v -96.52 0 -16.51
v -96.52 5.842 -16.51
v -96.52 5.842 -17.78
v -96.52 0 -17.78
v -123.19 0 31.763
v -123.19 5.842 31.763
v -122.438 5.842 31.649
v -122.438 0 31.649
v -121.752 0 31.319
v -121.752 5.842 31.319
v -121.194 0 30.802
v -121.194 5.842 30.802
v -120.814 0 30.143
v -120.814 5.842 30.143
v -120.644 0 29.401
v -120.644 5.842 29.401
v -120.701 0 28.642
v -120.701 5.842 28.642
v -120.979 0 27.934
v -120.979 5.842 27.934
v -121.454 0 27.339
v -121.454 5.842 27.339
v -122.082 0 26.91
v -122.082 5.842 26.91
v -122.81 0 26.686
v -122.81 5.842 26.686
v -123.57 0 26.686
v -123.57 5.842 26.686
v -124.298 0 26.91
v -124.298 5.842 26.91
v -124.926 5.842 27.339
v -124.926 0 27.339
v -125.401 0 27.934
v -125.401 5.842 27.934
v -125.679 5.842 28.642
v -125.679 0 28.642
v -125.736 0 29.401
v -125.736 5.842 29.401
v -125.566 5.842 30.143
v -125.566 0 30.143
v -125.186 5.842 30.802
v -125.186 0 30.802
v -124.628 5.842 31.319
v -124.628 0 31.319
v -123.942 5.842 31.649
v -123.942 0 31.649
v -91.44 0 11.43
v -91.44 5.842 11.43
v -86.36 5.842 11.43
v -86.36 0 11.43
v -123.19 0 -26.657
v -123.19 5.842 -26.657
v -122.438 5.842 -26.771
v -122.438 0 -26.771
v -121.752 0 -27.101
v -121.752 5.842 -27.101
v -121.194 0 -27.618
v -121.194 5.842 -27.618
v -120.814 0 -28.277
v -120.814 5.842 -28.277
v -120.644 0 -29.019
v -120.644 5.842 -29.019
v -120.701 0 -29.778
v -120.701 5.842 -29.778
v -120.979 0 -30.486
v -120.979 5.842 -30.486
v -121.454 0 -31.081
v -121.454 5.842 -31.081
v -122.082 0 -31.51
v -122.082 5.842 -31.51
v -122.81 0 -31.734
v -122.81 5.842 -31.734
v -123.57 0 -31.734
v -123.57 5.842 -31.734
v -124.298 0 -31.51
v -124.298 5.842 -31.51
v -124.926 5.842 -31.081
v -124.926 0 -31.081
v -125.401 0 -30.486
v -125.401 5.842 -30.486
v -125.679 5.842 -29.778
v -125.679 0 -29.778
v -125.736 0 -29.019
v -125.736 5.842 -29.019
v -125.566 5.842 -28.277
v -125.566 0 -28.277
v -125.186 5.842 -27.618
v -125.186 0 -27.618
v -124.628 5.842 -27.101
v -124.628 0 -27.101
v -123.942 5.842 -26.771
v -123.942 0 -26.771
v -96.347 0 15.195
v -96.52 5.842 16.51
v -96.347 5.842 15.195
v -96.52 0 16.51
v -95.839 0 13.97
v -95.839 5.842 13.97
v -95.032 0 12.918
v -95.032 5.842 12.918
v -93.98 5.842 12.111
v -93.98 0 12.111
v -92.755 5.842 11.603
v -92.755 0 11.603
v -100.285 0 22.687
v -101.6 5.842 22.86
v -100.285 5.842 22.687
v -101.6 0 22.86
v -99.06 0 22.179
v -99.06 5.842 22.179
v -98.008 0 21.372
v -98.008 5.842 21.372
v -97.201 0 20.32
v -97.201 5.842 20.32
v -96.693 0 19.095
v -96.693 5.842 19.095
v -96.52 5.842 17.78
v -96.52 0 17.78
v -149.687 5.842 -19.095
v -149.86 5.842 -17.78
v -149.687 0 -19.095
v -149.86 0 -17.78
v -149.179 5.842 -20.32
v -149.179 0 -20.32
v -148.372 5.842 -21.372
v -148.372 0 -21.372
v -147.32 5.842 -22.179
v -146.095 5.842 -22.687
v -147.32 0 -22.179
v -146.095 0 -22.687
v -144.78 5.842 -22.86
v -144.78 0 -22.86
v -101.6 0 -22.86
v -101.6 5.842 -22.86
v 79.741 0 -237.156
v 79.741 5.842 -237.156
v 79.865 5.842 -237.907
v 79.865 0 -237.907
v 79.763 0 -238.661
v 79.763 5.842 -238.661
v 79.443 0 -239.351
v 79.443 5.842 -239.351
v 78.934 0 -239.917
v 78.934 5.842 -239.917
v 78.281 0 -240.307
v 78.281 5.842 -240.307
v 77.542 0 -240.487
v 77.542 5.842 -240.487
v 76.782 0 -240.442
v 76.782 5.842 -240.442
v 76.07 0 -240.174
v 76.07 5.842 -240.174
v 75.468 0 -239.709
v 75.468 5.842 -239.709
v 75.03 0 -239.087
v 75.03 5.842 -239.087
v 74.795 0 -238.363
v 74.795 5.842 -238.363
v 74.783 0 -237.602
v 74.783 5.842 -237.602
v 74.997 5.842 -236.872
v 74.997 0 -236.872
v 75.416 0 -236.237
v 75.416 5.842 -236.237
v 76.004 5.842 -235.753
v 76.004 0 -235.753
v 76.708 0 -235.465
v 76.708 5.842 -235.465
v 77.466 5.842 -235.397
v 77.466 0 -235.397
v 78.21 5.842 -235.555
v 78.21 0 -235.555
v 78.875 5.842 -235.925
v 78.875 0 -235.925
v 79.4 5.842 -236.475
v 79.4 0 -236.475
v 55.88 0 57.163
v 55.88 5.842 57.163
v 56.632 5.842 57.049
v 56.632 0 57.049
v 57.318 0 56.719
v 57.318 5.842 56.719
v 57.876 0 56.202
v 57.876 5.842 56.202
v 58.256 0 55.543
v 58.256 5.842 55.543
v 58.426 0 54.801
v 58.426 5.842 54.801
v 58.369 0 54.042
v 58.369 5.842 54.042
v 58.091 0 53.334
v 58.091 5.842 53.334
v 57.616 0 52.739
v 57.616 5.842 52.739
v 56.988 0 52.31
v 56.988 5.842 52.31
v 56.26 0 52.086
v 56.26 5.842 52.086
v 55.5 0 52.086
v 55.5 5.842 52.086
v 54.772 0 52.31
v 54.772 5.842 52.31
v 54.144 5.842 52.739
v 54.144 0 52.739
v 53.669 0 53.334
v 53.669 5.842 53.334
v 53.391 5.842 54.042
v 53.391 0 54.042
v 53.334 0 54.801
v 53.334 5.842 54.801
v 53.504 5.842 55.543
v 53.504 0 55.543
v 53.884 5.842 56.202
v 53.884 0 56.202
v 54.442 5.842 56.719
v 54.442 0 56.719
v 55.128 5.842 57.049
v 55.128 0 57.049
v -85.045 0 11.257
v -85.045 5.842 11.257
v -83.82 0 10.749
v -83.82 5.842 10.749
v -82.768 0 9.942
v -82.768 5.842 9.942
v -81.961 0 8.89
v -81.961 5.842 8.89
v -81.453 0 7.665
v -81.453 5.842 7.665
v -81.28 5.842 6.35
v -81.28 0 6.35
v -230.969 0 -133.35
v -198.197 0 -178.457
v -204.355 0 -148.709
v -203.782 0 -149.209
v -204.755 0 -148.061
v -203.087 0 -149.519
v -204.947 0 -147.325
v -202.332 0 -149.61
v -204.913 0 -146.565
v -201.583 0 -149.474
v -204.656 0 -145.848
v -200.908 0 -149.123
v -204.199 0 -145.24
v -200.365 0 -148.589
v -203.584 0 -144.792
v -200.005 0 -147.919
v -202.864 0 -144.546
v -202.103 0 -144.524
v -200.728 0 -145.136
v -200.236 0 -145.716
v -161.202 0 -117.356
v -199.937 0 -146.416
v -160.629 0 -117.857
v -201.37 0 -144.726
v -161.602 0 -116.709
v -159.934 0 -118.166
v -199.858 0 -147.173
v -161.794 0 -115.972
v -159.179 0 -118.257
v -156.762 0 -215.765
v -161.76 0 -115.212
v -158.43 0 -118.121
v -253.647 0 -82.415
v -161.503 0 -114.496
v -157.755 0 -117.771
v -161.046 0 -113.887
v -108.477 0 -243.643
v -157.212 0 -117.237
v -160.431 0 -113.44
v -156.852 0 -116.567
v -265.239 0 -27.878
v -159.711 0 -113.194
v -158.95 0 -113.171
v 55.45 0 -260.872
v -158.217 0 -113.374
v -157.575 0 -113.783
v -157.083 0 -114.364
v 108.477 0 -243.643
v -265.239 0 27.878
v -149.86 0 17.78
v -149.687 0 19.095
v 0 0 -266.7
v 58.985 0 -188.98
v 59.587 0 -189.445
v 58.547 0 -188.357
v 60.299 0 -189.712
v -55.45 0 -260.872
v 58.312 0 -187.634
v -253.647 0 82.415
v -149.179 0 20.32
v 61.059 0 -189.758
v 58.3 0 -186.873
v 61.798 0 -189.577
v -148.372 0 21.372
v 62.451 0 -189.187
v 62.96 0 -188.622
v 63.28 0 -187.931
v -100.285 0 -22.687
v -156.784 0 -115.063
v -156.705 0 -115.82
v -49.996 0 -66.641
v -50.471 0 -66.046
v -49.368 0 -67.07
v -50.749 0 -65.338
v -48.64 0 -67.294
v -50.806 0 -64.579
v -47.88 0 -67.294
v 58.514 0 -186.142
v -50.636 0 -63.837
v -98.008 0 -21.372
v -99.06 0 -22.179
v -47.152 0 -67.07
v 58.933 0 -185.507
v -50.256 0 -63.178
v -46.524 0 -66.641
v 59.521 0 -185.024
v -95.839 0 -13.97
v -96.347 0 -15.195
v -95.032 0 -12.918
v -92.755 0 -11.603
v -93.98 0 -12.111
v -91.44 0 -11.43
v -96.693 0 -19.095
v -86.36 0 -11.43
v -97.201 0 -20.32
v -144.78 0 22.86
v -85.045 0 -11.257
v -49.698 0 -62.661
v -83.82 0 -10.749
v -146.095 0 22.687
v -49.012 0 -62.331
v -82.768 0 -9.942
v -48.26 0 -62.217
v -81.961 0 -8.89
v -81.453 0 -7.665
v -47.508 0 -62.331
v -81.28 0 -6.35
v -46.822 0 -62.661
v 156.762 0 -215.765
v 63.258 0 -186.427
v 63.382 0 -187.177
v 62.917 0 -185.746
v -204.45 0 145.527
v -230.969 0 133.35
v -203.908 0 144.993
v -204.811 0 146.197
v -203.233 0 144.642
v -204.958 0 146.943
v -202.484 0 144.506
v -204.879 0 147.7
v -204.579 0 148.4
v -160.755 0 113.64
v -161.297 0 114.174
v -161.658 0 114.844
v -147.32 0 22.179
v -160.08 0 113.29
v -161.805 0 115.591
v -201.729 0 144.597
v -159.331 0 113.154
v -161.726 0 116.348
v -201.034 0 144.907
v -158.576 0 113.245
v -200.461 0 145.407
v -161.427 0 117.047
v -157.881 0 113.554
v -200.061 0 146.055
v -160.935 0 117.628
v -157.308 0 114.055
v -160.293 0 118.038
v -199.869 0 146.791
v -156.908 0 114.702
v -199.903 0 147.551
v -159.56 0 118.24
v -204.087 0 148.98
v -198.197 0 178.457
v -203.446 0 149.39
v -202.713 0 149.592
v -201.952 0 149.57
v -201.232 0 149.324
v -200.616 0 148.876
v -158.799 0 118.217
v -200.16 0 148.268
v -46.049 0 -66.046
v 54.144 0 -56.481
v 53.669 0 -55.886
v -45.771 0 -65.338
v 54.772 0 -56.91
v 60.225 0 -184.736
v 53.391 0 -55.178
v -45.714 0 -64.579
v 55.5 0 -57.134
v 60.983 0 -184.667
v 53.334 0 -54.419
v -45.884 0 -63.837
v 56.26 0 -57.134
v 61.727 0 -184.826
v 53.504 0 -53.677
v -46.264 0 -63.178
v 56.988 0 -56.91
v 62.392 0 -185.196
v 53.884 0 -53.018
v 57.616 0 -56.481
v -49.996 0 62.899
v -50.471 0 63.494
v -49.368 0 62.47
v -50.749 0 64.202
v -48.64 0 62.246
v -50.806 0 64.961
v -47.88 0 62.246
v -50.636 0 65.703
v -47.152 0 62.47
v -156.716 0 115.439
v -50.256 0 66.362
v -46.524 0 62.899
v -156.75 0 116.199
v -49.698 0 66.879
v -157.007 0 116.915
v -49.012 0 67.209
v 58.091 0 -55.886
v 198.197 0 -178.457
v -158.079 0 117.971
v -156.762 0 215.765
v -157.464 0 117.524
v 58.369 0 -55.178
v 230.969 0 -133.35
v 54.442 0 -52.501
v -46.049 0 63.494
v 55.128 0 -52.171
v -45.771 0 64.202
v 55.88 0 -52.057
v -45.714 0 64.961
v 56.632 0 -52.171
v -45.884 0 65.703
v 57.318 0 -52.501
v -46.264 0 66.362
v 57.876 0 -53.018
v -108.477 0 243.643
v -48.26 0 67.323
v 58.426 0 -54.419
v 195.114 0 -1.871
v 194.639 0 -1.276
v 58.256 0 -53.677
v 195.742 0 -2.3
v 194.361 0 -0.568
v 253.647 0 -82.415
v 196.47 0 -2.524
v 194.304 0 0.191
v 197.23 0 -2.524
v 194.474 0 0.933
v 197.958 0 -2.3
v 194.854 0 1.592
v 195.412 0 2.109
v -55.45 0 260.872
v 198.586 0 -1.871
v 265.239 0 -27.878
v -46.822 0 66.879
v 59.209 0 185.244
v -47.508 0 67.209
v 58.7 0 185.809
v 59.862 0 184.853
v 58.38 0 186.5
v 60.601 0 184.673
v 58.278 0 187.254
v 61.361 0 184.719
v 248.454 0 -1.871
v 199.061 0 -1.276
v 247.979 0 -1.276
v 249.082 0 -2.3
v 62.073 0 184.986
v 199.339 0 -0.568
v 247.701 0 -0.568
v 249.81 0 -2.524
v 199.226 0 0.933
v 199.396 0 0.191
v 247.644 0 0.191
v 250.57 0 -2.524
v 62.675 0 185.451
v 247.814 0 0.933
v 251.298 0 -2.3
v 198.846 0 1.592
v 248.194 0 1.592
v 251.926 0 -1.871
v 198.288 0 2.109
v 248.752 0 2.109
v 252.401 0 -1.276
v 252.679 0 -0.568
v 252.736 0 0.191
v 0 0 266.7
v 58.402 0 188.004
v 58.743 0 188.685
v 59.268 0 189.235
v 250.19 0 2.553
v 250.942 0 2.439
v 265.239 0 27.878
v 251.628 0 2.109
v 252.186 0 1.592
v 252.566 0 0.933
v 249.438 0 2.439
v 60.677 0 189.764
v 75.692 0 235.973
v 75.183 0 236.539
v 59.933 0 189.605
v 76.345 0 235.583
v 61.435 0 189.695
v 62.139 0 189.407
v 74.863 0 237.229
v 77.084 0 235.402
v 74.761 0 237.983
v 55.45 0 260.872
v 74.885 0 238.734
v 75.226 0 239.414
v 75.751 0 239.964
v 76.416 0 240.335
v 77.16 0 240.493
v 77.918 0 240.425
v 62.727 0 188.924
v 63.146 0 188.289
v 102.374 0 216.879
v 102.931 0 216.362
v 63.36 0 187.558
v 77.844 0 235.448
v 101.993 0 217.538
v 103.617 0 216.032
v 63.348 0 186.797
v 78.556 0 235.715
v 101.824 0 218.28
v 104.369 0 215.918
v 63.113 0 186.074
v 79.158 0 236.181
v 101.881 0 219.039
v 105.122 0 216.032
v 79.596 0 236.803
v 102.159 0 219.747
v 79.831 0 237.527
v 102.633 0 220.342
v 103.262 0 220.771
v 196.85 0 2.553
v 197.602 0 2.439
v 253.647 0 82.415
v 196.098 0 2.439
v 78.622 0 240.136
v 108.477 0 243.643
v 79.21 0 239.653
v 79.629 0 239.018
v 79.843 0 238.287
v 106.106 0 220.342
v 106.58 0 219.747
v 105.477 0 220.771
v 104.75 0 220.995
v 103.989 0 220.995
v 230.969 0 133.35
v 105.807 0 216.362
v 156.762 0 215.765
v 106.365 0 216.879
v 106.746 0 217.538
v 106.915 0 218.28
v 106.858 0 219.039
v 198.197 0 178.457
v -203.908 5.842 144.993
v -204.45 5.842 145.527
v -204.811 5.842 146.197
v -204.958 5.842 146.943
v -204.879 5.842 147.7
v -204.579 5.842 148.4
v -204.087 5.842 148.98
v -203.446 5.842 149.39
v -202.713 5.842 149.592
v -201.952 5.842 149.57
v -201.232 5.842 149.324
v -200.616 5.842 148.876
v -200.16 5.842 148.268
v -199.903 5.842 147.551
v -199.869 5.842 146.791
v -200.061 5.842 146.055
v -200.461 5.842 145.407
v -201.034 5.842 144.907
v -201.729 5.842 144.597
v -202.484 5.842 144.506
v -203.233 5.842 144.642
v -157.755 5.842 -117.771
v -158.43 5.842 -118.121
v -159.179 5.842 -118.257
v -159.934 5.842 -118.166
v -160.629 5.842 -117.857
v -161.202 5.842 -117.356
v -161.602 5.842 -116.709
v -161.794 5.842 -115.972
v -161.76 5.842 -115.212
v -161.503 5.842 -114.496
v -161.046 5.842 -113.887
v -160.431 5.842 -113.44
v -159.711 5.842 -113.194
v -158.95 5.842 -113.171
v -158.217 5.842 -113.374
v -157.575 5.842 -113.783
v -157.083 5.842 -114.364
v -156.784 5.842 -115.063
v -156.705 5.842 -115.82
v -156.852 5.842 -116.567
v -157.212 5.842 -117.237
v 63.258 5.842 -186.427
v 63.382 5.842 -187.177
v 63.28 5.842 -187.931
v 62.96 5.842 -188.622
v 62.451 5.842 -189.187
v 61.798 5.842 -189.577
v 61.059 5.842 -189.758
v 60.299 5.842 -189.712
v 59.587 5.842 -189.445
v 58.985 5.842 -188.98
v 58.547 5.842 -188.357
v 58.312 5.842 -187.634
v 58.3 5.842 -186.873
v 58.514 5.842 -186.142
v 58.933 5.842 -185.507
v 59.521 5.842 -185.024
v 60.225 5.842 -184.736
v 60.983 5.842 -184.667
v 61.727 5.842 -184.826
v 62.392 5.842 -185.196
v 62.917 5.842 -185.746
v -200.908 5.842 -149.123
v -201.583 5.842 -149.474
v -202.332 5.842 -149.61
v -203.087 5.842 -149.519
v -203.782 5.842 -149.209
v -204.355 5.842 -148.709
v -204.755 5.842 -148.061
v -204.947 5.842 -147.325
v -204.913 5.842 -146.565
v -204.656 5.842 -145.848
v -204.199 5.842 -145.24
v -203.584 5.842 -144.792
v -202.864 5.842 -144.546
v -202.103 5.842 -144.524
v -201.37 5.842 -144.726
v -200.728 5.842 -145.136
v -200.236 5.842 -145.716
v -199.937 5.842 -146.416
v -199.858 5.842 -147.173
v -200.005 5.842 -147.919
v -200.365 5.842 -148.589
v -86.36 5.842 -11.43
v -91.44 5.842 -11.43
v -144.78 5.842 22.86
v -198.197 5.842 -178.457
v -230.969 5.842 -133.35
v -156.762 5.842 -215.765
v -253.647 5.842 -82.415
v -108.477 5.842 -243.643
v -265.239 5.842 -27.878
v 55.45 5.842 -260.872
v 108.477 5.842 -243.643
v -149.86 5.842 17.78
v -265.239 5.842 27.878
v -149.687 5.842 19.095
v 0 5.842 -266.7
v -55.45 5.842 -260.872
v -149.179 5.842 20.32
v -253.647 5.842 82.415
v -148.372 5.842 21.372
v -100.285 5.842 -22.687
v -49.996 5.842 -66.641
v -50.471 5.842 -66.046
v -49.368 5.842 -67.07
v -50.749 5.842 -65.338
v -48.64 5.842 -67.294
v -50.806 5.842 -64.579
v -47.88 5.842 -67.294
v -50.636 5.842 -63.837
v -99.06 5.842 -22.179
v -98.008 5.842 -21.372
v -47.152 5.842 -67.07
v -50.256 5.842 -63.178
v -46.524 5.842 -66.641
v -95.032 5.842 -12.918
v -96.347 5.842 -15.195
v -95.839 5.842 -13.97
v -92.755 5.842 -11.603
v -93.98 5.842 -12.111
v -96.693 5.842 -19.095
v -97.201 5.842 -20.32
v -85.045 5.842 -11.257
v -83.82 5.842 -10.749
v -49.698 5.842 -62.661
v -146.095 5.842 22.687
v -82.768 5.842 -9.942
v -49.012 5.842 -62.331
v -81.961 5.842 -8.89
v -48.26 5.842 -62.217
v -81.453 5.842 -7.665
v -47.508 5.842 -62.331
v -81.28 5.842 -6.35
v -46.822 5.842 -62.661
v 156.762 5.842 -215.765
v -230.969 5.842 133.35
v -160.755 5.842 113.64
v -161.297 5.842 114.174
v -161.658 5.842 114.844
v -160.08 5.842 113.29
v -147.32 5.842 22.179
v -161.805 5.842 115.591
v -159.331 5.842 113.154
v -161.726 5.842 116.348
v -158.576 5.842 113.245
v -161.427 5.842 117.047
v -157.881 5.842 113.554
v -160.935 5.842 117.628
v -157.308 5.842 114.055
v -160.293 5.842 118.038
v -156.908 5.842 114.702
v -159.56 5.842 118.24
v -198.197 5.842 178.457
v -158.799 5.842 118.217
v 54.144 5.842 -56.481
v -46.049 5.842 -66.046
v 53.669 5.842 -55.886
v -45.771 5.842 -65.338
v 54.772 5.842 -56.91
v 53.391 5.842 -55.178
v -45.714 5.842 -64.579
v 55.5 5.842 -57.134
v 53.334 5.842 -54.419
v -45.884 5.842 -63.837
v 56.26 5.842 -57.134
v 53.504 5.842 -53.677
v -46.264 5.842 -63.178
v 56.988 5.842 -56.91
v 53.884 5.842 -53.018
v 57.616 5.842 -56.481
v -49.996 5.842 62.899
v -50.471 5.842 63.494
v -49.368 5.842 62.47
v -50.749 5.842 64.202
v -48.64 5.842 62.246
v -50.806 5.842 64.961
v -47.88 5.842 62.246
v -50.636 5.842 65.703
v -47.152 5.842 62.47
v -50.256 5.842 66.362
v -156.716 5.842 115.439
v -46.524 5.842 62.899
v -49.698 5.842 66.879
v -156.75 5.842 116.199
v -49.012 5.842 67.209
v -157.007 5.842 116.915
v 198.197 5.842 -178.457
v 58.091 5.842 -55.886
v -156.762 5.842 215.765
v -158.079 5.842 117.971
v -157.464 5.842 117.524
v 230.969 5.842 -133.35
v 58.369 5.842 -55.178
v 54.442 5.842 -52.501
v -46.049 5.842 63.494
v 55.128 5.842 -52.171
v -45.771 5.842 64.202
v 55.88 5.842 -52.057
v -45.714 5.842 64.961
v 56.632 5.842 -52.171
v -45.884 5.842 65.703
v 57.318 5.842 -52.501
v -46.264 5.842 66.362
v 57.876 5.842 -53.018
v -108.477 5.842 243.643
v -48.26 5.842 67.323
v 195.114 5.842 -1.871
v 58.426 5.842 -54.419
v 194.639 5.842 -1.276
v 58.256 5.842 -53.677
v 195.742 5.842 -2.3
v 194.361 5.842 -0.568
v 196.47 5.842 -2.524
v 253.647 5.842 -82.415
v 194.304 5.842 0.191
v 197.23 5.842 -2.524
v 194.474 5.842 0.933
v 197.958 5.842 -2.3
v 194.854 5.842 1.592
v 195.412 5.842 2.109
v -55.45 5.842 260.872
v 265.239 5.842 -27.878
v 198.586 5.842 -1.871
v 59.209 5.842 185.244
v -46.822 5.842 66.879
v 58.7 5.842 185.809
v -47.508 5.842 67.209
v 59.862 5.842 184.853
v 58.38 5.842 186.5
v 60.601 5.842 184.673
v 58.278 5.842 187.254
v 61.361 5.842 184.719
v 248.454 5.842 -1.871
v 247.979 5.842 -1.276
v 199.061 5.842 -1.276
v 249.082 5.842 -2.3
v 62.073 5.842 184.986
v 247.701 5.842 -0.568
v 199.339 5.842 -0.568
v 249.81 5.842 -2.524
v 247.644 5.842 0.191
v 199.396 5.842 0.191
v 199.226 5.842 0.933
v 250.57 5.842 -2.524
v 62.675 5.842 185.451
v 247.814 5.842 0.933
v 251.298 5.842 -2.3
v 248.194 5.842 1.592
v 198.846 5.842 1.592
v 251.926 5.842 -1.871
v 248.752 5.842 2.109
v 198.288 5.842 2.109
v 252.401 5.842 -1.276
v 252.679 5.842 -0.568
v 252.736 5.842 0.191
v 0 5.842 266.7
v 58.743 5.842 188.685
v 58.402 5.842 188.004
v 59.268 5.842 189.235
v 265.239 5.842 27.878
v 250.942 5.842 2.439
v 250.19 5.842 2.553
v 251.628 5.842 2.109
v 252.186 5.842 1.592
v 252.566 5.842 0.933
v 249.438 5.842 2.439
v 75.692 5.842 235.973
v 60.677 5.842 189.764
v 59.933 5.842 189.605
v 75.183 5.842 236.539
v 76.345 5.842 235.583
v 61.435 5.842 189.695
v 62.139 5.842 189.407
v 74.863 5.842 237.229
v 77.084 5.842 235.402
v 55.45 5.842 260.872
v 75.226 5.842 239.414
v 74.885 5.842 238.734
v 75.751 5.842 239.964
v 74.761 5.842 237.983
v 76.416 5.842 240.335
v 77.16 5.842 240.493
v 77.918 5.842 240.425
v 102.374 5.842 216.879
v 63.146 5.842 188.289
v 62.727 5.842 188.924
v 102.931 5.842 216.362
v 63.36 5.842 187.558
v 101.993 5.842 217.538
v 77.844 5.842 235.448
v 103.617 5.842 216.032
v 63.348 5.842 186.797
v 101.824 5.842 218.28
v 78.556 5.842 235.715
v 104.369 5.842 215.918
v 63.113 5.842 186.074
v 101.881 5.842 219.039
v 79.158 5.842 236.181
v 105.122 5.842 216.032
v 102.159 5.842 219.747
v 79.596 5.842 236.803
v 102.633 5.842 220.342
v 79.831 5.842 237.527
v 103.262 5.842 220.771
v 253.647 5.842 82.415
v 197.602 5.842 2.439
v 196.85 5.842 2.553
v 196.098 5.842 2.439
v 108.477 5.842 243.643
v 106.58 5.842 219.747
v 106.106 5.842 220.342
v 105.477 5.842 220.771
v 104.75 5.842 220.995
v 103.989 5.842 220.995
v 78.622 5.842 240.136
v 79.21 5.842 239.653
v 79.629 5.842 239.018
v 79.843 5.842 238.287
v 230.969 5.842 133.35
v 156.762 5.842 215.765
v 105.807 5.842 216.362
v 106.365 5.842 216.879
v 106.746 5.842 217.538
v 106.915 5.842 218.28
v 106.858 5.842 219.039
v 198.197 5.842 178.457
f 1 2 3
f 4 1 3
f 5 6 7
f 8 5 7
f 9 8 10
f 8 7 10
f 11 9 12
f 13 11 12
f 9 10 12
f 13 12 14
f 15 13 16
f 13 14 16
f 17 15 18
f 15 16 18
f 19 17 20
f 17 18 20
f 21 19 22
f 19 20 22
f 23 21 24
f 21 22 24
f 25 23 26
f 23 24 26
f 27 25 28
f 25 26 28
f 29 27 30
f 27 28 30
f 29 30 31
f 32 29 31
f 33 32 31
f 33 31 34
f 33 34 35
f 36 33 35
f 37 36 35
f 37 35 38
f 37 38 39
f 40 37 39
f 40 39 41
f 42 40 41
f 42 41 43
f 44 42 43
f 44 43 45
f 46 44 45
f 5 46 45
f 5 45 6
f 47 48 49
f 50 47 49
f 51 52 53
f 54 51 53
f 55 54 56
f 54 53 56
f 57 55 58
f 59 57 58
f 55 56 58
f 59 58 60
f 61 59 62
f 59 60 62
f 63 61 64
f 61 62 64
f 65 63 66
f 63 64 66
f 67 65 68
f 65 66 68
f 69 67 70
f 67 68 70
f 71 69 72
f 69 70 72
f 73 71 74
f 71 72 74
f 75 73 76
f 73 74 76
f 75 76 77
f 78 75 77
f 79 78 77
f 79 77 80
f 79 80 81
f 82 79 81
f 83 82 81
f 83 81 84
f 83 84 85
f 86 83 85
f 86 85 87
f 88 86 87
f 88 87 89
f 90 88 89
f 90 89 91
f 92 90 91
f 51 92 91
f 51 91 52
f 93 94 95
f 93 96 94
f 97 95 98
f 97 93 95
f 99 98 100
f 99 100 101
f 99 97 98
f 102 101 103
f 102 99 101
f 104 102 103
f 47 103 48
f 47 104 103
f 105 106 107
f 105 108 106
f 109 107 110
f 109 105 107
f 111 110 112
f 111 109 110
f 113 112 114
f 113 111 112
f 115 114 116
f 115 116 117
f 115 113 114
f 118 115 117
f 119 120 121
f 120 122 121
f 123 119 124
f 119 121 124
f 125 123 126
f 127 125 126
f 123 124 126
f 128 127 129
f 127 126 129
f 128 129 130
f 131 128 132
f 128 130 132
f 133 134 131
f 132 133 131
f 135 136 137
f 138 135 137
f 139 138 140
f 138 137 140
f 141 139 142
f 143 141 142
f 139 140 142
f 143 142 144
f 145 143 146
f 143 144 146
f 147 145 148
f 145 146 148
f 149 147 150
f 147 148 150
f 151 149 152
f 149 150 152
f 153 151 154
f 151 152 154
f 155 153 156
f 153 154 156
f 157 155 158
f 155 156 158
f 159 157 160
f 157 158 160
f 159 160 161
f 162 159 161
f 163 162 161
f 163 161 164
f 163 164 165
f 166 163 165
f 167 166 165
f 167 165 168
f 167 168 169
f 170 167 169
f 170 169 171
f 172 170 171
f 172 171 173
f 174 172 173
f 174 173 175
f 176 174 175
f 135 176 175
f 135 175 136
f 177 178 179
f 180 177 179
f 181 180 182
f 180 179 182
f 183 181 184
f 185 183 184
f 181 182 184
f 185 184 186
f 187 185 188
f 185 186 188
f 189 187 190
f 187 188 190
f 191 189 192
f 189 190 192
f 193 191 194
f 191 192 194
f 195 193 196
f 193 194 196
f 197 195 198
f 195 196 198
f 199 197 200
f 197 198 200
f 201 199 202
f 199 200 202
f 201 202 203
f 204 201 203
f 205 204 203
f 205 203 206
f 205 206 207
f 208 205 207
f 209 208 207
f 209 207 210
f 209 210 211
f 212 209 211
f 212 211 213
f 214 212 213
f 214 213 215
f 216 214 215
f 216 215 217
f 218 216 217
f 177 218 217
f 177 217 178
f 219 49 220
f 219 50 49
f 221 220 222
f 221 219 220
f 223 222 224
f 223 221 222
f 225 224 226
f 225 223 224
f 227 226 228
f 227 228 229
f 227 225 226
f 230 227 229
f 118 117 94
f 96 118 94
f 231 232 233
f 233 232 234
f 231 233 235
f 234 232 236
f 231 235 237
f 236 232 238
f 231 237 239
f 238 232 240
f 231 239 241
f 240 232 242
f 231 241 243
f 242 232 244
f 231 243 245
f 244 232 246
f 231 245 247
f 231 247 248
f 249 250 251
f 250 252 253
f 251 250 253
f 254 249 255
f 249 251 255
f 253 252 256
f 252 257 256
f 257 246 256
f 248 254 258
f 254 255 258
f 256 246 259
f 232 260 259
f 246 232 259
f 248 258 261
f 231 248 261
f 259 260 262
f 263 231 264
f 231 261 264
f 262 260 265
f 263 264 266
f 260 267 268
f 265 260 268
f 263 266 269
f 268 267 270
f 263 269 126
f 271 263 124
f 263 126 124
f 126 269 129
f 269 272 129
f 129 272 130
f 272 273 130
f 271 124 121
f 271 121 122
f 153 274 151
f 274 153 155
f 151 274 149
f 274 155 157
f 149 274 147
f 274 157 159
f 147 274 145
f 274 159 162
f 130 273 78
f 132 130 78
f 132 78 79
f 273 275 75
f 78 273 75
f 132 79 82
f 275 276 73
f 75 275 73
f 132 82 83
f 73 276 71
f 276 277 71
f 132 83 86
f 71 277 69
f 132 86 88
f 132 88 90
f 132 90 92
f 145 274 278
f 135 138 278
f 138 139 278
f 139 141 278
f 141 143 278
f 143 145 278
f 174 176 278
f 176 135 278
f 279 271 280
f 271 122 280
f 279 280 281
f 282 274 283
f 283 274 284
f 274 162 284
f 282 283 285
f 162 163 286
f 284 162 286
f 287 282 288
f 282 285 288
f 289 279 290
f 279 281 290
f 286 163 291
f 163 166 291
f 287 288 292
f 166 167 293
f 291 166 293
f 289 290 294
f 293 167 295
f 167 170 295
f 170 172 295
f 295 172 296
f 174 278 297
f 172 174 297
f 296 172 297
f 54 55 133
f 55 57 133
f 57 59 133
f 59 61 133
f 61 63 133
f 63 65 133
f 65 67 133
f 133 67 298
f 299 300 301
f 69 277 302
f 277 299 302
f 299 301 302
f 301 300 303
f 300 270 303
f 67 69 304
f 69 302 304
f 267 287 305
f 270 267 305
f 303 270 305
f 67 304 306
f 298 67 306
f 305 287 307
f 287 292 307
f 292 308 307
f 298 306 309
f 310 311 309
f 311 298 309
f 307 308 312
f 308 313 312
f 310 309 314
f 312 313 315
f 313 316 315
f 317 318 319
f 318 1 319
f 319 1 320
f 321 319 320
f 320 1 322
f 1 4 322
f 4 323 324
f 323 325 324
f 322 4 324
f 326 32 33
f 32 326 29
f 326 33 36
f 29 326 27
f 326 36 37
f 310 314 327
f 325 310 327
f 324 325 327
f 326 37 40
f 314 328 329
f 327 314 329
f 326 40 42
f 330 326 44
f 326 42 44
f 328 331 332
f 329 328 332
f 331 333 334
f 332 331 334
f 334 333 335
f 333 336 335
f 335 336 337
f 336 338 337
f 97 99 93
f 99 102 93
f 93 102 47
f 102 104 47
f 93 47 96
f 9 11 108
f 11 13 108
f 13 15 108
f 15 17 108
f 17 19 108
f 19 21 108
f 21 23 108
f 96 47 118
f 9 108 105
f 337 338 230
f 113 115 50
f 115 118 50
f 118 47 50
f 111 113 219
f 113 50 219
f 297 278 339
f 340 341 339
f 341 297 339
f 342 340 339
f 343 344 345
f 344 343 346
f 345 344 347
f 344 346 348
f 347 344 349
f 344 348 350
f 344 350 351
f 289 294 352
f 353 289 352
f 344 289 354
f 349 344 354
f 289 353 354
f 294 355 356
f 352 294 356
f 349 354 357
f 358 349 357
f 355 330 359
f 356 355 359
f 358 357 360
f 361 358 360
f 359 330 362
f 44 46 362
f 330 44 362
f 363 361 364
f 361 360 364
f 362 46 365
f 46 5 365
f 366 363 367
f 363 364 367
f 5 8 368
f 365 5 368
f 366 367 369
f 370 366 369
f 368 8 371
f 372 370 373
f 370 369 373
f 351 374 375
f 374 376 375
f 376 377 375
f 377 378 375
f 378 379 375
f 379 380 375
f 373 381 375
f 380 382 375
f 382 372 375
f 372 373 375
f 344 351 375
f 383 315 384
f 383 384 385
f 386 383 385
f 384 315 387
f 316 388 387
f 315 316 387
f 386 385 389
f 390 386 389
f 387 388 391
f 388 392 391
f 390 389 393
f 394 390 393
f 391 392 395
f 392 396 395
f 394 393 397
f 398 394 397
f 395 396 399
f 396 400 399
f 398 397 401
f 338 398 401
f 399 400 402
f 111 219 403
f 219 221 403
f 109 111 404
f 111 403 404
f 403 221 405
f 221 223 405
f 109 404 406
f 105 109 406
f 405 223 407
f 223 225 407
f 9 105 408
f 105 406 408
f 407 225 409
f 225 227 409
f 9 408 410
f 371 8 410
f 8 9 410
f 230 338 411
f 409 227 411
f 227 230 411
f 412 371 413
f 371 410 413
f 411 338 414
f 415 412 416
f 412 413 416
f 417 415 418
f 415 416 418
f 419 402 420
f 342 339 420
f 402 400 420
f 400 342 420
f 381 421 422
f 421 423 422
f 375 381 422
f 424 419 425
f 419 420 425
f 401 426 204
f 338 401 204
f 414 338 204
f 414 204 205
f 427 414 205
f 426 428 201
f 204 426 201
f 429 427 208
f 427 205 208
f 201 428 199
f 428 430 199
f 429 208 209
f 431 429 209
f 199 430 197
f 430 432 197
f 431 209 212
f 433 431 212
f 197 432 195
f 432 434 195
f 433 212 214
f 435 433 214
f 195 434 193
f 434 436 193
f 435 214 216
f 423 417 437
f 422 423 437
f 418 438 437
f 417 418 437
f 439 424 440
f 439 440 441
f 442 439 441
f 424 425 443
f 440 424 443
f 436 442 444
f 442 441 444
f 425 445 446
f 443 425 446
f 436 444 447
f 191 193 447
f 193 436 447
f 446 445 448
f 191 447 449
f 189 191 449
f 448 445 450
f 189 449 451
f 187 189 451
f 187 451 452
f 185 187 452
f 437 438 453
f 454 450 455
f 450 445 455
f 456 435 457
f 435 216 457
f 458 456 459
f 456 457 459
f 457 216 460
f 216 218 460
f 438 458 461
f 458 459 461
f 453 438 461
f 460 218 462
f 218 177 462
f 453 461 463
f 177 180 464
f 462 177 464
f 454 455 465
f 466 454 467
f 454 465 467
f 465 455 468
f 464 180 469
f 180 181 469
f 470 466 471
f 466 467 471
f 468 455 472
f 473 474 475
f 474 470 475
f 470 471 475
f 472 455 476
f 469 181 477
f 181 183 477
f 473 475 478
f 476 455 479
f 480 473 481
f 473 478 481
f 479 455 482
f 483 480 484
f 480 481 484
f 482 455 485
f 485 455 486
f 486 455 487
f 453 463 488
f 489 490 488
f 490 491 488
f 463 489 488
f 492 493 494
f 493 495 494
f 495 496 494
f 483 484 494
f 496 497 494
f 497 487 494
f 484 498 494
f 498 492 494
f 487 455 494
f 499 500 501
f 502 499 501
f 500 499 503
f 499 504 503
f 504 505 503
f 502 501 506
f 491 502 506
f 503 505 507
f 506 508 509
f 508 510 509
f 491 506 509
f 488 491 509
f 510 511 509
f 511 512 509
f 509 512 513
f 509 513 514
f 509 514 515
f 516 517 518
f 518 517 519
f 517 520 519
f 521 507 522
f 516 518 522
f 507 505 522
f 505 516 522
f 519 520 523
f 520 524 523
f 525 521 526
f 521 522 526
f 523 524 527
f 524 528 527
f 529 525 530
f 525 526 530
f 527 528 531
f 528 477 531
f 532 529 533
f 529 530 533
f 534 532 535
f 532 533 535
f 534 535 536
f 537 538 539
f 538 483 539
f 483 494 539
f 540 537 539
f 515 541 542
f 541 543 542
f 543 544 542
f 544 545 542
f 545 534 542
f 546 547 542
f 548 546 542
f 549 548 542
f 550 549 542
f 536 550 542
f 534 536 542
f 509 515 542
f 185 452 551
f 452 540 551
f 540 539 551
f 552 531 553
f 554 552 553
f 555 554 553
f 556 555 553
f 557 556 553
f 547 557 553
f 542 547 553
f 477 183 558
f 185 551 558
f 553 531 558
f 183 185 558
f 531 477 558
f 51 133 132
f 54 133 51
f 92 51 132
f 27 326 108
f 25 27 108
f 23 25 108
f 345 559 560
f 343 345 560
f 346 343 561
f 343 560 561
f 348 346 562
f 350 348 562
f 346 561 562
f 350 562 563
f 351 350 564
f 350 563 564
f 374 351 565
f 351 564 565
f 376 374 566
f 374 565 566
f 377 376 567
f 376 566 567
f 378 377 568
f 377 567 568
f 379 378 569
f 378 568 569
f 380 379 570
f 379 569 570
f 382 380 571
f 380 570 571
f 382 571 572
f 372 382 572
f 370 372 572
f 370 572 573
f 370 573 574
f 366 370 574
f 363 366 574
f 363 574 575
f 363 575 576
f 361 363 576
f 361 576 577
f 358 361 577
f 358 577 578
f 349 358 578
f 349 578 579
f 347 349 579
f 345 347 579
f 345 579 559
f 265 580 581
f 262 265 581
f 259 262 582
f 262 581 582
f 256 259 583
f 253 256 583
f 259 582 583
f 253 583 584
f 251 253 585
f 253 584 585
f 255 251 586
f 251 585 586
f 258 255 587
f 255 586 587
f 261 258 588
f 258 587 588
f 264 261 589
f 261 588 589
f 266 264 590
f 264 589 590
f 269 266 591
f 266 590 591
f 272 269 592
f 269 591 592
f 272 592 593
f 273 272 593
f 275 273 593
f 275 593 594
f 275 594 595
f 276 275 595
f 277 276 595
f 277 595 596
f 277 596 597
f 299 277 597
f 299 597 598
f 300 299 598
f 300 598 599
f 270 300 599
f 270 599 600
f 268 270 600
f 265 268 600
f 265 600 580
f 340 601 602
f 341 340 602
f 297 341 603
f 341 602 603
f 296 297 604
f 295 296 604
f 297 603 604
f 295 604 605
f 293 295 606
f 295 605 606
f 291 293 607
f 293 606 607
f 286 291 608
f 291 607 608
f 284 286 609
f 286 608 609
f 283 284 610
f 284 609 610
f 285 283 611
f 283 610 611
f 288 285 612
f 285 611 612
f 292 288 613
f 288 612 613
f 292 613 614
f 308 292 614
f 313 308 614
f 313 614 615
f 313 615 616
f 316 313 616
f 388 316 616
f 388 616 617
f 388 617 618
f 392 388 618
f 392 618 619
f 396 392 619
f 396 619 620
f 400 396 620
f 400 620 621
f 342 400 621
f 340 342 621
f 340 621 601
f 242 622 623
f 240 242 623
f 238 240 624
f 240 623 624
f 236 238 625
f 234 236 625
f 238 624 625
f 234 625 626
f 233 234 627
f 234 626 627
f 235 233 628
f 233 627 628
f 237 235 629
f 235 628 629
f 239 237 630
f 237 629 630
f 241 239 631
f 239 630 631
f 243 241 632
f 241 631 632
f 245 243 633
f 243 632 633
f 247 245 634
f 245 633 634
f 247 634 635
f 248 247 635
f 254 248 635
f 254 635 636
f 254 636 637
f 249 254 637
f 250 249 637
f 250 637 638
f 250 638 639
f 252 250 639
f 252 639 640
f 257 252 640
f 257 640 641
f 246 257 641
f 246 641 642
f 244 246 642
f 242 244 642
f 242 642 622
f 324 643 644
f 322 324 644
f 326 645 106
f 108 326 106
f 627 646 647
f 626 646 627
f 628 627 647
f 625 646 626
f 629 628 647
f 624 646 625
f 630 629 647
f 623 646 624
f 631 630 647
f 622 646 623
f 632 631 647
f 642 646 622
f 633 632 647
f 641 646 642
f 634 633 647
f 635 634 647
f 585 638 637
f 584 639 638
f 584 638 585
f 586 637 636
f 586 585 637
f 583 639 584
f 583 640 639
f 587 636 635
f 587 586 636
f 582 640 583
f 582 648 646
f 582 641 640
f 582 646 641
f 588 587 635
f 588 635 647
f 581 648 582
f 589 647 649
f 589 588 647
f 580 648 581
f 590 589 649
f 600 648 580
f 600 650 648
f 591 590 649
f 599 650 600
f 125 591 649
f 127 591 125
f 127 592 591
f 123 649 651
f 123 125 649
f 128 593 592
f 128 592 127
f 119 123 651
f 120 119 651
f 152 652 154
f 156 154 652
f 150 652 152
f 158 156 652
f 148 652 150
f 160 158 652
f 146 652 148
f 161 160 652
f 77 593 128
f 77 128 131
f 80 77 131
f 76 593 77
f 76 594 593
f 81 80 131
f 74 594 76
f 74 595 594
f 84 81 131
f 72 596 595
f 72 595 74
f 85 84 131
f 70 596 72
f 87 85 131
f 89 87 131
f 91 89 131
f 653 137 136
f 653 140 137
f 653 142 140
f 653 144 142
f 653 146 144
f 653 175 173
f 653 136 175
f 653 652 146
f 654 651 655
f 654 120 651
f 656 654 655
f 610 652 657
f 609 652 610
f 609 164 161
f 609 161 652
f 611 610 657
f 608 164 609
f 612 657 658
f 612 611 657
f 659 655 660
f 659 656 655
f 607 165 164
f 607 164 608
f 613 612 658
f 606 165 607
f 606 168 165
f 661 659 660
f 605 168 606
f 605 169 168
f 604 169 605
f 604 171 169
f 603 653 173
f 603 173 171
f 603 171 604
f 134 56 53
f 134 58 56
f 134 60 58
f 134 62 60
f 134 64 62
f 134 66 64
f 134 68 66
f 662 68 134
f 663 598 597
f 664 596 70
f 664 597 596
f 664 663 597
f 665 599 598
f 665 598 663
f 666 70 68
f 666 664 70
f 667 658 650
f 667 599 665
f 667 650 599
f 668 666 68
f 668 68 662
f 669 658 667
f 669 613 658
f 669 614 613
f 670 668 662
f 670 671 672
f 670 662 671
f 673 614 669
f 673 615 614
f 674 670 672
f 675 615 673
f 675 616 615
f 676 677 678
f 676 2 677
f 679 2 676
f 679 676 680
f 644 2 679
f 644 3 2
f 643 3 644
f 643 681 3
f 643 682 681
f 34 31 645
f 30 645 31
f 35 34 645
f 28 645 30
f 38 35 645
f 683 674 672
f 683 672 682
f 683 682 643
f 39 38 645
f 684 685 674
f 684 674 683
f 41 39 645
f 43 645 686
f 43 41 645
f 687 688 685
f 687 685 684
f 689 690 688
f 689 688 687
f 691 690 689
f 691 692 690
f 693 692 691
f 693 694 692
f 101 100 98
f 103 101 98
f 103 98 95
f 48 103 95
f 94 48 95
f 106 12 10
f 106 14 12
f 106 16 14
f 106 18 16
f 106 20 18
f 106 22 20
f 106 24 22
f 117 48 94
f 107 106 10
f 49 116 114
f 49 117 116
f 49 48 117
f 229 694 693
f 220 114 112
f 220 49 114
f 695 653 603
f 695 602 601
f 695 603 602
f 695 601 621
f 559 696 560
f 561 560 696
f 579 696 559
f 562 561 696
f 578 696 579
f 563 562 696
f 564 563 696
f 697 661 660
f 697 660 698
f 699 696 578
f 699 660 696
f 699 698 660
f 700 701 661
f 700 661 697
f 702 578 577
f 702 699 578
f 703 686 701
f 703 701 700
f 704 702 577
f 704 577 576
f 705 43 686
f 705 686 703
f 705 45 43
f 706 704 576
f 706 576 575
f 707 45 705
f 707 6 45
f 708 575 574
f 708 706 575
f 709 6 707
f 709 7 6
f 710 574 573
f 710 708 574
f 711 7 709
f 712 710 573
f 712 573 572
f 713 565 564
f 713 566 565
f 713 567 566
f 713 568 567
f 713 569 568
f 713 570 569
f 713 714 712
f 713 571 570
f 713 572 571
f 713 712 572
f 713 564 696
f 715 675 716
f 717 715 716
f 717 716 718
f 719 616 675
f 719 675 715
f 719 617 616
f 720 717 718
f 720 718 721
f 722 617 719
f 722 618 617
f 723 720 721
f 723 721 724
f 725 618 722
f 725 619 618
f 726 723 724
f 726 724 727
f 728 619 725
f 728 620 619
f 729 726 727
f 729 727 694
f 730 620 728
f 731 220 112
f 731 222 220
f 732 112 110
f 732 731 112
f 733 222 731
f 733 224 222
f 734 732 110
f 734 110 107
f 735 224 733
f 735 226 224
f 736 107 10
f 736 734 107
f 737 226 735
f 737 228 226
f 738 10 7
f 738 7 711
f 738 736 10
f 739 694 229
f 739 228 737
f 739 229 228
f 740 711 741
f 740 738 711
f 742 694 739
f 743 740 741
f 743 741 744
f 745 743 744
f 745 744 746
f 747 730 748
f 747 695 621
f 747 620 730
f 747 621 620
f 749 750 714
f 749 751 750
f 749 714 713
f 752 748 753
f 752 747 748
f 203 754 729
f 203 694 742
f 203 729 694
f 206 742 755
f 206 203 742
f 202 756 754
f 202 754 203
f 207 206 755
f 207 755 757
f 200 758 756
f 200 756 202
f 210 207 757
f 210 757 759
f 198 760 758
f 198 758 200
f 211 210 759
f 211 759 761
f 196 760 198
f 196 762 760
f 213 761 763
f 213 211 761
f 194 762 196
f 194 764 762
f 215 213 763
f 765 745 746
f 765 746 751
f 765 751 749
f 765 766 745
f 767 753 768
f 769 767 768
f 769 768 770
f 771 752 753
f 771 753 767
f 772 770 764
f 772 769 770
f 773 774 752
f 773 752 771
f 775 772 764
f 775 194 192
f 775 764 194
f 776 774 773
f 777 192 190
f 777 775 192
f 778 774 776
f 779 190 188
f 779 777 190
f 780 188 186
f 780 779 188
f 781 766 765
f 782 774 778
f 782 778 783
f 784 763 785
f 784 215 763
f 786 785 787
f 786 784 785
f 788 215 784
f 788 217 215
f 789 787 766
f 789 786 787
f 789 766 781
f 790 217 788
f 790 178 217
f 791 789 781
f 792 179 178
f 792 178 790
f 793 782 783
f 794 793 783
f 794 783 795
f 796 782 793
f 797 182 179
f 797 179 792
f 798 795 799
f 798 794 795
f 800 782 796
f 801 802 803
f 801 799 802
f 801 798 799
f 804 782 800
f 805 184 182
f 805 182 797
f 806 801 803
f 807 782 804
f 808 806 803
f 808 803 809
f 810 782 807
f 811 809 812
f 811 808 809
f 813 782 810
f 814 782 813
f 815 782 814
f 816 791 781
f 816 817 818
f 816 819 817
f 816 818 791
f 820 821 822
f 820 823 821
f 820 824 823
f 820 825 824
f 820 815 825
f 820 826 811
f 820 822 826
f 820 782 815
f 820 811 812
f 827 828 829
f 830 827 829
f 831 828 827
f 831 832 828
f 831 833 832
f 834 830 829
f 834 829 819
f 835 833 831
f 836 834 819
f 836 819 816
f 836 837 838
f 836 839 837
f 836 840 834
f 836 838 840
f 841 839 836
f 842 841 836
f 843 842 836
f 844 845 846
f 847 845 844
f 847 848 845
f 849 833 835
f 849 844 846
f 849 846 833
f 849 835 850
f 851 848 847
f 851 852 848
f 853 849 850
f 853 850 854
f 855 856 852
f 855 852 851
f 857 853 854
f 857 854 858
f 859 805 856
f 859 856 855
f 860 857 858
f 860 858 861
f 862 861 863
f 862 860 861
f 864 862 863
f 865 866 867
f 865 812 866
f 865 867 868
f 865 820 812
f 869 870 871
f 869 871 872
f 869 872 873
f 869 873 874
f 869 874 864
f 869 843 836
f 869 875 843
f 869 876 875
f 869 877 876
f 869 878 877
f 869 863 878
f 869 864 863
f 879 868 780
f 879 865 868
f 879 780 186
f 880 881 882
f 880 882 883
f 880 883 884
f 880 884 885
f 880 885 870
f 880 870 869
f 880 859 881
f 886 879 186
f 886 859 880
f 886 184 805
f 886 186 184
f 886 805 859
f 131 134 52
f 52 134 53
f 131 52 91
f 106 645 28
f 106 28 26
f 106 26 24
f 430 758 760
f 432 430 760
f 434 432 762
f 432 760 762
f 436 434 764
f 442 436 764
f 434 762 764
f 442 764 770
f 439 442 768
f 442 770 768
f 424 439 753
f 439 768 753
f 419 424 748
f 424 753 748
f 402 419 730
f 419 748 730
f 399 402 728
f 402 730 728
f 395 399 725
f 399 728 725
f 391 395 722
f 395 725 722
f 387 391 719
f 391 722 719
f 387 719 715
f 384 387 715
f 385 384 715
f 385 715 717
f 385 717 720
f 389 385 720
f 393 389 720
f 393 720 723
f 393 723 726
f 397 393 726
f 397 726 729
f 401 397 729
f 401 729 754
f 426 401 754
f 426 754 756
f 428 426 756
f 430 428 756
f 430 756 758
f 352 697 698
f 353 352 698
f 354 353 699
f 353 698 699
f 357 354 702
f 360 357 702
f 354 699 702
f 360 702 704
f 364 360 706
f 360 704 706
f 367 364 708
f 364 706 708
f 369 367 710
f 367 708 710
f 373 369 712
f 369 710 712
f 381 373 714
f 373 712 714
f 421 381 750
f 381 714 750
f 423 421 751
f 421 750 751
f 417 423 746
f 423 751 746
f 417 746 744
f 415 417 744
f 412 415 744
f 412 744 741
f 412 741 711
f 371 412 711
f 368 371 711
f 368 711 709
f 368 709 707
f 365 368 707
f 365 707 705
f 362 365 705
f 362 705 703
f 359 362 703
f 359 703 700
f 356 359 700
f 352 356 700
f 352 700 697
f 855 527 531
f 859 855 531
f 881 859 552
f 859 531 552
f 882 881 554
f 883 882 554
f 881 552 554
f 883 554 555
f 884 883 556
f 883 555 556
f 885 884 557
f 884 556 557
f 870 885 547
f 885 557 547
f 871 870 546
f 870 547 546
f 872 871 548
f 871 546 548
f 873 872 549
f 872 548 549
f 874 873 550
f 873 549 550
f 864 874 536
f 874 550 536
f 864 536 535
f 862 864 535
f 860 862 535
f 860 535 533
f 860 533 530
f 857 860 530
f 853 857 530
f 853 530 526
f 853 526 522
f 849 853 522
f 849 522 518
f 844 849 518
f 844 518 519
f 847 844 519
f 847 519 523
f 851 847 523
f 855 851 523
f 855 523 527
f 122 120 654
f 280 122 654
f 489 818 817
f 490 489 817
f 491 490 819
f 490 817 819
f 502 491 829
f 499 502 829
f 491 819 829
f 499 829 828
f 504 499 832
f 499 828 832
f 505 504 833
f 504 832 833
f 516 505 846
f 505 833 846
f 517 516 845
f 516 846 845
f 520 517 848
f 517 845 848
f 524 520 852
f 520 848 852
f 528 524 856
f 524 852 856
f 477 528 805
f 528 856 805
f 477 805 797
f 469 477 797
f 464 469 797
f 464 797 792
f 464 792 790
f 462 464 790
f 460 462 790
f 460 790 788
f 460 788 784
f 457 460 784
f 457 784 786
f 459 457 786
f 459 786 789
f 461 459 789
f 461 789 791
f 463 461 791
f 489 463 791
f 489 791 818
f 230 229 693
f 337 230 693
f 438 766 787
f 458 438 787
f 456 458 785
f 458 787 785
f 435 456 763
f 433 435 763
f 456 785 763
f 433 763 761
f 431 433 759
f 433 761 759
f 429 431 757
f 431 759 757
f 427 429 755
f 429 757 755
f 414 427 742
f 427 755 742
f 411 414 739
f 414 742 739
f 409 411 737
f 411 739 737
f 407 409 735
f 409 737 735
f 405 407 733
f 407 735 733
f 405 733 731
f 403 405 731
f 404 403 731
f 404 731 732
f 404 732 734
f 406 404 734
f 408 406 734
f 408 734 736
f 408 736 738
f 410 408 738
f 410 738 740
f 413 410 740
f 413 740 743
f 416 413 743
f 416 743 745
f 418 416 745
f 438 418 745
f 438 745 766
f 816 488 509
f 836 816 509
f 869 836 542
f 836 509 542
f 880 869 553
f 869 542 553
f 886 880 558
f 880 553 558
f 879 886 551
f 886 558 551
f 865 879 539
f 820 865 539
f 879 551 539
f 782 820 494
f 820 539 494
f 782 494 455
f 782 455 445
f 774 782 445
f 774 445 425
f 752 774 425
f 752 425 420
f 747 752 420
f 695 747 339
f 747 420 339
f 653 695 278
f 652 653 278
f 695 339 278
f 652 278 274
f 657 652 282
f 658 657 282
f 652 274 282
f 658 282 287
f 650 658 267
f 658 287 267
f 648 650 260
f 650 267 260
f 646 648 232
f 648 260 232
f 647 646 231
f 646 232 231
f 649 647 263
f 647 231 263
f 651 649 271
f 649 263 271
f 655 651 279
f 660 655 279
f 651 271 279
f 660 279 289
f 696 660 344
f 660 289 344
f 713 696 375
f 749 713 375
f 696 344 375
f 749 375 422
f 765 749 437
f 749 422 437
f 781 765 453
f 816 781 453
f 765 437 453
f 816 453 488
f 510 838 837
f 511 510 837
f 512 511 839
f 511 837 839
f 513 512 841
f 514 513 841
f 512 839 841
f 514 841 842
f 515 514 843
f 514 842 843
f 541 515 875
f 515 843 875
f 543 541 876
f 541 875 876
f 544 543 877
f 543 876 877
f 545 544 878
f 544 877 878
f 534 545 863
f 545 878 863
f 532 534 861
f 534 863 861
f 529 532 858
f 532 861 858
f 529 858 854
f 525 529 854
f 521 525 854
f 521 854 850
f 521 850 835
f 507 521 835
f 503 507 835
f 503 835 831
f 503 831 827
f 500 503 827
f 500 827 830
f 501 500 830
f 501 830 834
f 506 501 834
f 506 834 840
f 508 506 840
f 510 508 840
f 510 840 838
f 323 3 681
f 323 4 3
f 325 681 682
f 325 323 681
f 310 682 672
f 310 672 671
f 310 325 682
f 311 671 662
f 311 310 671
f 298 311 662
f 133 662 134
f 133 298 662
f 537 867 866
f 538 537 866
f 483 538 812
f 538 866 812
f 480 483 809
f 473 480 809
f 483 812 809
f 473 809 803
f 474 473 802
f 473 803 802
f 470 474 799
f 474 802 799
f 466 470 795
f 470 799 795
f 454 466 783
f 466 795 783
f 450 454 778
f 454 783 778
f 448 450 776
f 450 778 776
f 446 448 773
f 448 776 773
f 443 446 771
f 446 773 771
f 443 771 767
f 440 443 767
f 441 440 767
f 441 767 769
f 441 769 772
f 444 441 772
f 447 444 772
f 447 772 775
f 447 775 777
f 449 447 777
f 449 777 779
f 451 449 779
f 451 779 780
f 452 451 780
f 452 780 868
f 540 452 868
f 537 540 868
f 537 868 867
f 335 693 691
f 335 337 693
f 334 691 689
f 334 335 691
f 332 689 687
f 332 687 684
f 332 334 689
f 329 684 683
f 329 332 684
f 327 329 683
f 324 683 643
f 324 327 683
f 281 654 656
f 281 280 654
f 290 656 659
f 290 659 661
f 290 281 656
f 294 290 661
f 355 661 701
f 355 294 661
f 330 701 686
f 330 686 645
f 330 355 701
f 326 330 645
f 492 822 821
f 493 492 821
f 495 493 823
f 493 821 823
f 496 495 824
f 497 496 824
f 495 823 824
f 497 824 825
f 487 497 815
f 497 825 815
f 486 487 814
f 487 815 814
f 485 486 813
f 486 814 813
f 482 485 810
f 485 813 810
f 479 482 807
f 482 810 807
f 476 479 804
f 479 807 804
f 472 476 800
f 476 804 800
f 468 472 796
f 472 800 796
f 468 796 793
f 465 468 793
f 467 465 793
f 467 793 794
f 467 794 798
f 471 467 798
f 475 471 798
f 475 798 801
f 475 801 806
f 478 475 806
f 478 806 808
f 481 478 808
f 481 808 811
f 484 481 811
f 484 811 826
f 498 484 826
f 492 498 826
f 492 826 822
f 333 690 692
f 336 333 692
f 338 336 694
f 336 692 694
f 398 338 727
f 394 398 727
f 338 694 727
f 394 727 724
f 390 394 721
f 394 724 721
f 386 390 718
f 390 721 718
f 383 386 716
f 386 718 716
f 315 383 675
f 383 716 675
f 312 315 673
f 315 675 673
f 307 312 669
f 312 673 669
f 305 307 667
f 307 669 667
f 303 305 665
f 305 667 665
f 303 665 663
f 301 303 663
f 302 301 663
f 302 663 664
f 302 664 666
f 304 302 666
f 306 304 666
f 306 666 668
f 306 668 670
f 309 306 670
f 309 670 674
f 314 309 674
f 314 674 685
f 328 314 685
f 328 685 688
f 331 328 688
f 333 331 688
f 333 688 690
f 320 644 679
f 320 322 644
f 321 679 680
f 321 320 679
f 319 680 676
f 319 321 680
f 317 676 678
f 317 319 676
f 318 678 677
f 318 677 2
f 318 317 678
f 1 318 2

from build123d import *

# Parameters (mm, degrees)
SKETCH1_R                       = 266.7
BOSS_EXTRUDE1_DEPTH             = 5.842
SKETCH2_R                       = 2.5527
HOLES_MOUNTINGPOLARMECH_DEPTH   = 378.215997757
CUTOUT_STEPPERMOTORRELIEF_DEPTH = 378.215997757
FILLET_STEPPERMOTORRELIEF_R     = 5.08
SKETCH4_R                       = 2.5527
HOLES_FEET_DEPTH                = 378.215997757
CIRPATTERN_FEET_COUNT           = 5
SKETCH5_R                       = 2.5527
CUT_EXTRUDE1_DEPTH              = 378.215997757


with BuildPart() as part:
    # Sketch1 → Boss-Extrude1 (new body)
    with BuildSketch(Plane(origin=(0, 0, 0), x_dir=(1, 0, 0), z_dir=(0, 1, 0))):
        Circle(SKETCH1_R)
    extrude(amount=BOSS_EXTRUDE1_DEPTH)

    # Sketch2 → Holes-MountingPolarMech (cut, through all)
    with BuildSketch(Plane(origin=(0, 5.842, 0), x_dir=(1, 0, 0), z_dir=(0, 1, 0))):
        with Locations((55.88, 54.61)):
            Circle(SKETCH2_R)
        with Locations((-48.26, 64.77)):
            Circle(SKETCH2_R)
        with Locations((-48.26, -64.77)):
            Circle(SKETCH2_R)
        with Locations((55.88, -54.61)):
            Circle(SKETCH2_R)
        with Locations((-123.19, 29.21)):
            Circle(SKETCH2_R)
        with Locations((-123.19, -29.21)):
            Circle(SKETCH2_R)
    extrude(amount=-HOLES_MOUNTINGPOLARMECH_DEPTH, mode=Mode.SUBTRACT)

    # Sketch3 → Cutout-StepperMotorRelief (cut, through all)
    with BuildSketch(Plane(origin=(0, 5.842, 0), x_dir=(1, 0, 0), z_dir=(0, 1, 0))):
        Polygon((-123.19, 22.86), (-149.86, 22.86), (-149.86, 0), (-149.86, -22.86), (-123.19, -22.86), (-96.52, -22.86), (-96.52, -11.43), (-81.28, -11.43), (-81.28, 0), (-81.28, 11.43), (-96.52, 11.43), (-96.52, 22.86), align=None)
    extrude(amount=-CUTOUT_STEPPERMOTORRELIEF_DEPTH, mode=Mode.SUBTRACT)

    # Fillet-StepperMotorRelief
    fillet_steppermotorrelief_edges = [part.edges().sort_by_distance(p)[0] for p in [
        (-149.86, 2.921, -22.86),
        (-149.86, 2.921, 22.86),
        (-96.52, 2.921, -22.86),
        (-96.52, 2.921, -11.43),
        (-81.28, 2.921, -11.43),
        (-96.52, 2.921, 11.43),
        (-81.28, 2.921, 11.43),
        (-96.52, 2.921, 22.86),
    ]]
    fillet(fillet_steppermotorrelief_edges, radius=FILLET_STEPPERMOTORRELIEF_R)

    # Sketch4 → Holes-Feet (cut, through all)
    with BuildSketch(Plane(origin=(0, 5.842, 0), x_dir=(1, 0, 0), z_dir=(0, 1, 0))):
        with Locations((250.19, 0)):
            Circle(SKETCH4_R)
        with Locations((196.85, 0)):
            Circle(SKETCH4_R)
    holes_feet = extrude(amount=-HOLES_FEET_DEPTH, mode=Mode.SUBTRACT)

    # CirPattern-Feet: Holes-Feet ×5 about axis
    cirpattern_feet_axis = Axis((0, 6.1341, 0), (0, -1, 0))
    for i in range(1, CIRPATTERN_FEET_COUNT):
        add(holes_feet.rotate(cirpattern_feet_axis, i * 360 / CIRPATTERN_FEET_COUNT), mode=Mode.SUBTRACT)

    # Sketch5 → Cut-Extrude1 (cut, through all)
    with BuildSketch(Plane.XZ):
        with Locations((104.369393552, 218.470806035)):
            Circle(SKETCH5_R)
    extrude(amount=-CUT_EXTRUDE1_DEPTH, mode=Mode.SUBTRACT)


solid = part.part
